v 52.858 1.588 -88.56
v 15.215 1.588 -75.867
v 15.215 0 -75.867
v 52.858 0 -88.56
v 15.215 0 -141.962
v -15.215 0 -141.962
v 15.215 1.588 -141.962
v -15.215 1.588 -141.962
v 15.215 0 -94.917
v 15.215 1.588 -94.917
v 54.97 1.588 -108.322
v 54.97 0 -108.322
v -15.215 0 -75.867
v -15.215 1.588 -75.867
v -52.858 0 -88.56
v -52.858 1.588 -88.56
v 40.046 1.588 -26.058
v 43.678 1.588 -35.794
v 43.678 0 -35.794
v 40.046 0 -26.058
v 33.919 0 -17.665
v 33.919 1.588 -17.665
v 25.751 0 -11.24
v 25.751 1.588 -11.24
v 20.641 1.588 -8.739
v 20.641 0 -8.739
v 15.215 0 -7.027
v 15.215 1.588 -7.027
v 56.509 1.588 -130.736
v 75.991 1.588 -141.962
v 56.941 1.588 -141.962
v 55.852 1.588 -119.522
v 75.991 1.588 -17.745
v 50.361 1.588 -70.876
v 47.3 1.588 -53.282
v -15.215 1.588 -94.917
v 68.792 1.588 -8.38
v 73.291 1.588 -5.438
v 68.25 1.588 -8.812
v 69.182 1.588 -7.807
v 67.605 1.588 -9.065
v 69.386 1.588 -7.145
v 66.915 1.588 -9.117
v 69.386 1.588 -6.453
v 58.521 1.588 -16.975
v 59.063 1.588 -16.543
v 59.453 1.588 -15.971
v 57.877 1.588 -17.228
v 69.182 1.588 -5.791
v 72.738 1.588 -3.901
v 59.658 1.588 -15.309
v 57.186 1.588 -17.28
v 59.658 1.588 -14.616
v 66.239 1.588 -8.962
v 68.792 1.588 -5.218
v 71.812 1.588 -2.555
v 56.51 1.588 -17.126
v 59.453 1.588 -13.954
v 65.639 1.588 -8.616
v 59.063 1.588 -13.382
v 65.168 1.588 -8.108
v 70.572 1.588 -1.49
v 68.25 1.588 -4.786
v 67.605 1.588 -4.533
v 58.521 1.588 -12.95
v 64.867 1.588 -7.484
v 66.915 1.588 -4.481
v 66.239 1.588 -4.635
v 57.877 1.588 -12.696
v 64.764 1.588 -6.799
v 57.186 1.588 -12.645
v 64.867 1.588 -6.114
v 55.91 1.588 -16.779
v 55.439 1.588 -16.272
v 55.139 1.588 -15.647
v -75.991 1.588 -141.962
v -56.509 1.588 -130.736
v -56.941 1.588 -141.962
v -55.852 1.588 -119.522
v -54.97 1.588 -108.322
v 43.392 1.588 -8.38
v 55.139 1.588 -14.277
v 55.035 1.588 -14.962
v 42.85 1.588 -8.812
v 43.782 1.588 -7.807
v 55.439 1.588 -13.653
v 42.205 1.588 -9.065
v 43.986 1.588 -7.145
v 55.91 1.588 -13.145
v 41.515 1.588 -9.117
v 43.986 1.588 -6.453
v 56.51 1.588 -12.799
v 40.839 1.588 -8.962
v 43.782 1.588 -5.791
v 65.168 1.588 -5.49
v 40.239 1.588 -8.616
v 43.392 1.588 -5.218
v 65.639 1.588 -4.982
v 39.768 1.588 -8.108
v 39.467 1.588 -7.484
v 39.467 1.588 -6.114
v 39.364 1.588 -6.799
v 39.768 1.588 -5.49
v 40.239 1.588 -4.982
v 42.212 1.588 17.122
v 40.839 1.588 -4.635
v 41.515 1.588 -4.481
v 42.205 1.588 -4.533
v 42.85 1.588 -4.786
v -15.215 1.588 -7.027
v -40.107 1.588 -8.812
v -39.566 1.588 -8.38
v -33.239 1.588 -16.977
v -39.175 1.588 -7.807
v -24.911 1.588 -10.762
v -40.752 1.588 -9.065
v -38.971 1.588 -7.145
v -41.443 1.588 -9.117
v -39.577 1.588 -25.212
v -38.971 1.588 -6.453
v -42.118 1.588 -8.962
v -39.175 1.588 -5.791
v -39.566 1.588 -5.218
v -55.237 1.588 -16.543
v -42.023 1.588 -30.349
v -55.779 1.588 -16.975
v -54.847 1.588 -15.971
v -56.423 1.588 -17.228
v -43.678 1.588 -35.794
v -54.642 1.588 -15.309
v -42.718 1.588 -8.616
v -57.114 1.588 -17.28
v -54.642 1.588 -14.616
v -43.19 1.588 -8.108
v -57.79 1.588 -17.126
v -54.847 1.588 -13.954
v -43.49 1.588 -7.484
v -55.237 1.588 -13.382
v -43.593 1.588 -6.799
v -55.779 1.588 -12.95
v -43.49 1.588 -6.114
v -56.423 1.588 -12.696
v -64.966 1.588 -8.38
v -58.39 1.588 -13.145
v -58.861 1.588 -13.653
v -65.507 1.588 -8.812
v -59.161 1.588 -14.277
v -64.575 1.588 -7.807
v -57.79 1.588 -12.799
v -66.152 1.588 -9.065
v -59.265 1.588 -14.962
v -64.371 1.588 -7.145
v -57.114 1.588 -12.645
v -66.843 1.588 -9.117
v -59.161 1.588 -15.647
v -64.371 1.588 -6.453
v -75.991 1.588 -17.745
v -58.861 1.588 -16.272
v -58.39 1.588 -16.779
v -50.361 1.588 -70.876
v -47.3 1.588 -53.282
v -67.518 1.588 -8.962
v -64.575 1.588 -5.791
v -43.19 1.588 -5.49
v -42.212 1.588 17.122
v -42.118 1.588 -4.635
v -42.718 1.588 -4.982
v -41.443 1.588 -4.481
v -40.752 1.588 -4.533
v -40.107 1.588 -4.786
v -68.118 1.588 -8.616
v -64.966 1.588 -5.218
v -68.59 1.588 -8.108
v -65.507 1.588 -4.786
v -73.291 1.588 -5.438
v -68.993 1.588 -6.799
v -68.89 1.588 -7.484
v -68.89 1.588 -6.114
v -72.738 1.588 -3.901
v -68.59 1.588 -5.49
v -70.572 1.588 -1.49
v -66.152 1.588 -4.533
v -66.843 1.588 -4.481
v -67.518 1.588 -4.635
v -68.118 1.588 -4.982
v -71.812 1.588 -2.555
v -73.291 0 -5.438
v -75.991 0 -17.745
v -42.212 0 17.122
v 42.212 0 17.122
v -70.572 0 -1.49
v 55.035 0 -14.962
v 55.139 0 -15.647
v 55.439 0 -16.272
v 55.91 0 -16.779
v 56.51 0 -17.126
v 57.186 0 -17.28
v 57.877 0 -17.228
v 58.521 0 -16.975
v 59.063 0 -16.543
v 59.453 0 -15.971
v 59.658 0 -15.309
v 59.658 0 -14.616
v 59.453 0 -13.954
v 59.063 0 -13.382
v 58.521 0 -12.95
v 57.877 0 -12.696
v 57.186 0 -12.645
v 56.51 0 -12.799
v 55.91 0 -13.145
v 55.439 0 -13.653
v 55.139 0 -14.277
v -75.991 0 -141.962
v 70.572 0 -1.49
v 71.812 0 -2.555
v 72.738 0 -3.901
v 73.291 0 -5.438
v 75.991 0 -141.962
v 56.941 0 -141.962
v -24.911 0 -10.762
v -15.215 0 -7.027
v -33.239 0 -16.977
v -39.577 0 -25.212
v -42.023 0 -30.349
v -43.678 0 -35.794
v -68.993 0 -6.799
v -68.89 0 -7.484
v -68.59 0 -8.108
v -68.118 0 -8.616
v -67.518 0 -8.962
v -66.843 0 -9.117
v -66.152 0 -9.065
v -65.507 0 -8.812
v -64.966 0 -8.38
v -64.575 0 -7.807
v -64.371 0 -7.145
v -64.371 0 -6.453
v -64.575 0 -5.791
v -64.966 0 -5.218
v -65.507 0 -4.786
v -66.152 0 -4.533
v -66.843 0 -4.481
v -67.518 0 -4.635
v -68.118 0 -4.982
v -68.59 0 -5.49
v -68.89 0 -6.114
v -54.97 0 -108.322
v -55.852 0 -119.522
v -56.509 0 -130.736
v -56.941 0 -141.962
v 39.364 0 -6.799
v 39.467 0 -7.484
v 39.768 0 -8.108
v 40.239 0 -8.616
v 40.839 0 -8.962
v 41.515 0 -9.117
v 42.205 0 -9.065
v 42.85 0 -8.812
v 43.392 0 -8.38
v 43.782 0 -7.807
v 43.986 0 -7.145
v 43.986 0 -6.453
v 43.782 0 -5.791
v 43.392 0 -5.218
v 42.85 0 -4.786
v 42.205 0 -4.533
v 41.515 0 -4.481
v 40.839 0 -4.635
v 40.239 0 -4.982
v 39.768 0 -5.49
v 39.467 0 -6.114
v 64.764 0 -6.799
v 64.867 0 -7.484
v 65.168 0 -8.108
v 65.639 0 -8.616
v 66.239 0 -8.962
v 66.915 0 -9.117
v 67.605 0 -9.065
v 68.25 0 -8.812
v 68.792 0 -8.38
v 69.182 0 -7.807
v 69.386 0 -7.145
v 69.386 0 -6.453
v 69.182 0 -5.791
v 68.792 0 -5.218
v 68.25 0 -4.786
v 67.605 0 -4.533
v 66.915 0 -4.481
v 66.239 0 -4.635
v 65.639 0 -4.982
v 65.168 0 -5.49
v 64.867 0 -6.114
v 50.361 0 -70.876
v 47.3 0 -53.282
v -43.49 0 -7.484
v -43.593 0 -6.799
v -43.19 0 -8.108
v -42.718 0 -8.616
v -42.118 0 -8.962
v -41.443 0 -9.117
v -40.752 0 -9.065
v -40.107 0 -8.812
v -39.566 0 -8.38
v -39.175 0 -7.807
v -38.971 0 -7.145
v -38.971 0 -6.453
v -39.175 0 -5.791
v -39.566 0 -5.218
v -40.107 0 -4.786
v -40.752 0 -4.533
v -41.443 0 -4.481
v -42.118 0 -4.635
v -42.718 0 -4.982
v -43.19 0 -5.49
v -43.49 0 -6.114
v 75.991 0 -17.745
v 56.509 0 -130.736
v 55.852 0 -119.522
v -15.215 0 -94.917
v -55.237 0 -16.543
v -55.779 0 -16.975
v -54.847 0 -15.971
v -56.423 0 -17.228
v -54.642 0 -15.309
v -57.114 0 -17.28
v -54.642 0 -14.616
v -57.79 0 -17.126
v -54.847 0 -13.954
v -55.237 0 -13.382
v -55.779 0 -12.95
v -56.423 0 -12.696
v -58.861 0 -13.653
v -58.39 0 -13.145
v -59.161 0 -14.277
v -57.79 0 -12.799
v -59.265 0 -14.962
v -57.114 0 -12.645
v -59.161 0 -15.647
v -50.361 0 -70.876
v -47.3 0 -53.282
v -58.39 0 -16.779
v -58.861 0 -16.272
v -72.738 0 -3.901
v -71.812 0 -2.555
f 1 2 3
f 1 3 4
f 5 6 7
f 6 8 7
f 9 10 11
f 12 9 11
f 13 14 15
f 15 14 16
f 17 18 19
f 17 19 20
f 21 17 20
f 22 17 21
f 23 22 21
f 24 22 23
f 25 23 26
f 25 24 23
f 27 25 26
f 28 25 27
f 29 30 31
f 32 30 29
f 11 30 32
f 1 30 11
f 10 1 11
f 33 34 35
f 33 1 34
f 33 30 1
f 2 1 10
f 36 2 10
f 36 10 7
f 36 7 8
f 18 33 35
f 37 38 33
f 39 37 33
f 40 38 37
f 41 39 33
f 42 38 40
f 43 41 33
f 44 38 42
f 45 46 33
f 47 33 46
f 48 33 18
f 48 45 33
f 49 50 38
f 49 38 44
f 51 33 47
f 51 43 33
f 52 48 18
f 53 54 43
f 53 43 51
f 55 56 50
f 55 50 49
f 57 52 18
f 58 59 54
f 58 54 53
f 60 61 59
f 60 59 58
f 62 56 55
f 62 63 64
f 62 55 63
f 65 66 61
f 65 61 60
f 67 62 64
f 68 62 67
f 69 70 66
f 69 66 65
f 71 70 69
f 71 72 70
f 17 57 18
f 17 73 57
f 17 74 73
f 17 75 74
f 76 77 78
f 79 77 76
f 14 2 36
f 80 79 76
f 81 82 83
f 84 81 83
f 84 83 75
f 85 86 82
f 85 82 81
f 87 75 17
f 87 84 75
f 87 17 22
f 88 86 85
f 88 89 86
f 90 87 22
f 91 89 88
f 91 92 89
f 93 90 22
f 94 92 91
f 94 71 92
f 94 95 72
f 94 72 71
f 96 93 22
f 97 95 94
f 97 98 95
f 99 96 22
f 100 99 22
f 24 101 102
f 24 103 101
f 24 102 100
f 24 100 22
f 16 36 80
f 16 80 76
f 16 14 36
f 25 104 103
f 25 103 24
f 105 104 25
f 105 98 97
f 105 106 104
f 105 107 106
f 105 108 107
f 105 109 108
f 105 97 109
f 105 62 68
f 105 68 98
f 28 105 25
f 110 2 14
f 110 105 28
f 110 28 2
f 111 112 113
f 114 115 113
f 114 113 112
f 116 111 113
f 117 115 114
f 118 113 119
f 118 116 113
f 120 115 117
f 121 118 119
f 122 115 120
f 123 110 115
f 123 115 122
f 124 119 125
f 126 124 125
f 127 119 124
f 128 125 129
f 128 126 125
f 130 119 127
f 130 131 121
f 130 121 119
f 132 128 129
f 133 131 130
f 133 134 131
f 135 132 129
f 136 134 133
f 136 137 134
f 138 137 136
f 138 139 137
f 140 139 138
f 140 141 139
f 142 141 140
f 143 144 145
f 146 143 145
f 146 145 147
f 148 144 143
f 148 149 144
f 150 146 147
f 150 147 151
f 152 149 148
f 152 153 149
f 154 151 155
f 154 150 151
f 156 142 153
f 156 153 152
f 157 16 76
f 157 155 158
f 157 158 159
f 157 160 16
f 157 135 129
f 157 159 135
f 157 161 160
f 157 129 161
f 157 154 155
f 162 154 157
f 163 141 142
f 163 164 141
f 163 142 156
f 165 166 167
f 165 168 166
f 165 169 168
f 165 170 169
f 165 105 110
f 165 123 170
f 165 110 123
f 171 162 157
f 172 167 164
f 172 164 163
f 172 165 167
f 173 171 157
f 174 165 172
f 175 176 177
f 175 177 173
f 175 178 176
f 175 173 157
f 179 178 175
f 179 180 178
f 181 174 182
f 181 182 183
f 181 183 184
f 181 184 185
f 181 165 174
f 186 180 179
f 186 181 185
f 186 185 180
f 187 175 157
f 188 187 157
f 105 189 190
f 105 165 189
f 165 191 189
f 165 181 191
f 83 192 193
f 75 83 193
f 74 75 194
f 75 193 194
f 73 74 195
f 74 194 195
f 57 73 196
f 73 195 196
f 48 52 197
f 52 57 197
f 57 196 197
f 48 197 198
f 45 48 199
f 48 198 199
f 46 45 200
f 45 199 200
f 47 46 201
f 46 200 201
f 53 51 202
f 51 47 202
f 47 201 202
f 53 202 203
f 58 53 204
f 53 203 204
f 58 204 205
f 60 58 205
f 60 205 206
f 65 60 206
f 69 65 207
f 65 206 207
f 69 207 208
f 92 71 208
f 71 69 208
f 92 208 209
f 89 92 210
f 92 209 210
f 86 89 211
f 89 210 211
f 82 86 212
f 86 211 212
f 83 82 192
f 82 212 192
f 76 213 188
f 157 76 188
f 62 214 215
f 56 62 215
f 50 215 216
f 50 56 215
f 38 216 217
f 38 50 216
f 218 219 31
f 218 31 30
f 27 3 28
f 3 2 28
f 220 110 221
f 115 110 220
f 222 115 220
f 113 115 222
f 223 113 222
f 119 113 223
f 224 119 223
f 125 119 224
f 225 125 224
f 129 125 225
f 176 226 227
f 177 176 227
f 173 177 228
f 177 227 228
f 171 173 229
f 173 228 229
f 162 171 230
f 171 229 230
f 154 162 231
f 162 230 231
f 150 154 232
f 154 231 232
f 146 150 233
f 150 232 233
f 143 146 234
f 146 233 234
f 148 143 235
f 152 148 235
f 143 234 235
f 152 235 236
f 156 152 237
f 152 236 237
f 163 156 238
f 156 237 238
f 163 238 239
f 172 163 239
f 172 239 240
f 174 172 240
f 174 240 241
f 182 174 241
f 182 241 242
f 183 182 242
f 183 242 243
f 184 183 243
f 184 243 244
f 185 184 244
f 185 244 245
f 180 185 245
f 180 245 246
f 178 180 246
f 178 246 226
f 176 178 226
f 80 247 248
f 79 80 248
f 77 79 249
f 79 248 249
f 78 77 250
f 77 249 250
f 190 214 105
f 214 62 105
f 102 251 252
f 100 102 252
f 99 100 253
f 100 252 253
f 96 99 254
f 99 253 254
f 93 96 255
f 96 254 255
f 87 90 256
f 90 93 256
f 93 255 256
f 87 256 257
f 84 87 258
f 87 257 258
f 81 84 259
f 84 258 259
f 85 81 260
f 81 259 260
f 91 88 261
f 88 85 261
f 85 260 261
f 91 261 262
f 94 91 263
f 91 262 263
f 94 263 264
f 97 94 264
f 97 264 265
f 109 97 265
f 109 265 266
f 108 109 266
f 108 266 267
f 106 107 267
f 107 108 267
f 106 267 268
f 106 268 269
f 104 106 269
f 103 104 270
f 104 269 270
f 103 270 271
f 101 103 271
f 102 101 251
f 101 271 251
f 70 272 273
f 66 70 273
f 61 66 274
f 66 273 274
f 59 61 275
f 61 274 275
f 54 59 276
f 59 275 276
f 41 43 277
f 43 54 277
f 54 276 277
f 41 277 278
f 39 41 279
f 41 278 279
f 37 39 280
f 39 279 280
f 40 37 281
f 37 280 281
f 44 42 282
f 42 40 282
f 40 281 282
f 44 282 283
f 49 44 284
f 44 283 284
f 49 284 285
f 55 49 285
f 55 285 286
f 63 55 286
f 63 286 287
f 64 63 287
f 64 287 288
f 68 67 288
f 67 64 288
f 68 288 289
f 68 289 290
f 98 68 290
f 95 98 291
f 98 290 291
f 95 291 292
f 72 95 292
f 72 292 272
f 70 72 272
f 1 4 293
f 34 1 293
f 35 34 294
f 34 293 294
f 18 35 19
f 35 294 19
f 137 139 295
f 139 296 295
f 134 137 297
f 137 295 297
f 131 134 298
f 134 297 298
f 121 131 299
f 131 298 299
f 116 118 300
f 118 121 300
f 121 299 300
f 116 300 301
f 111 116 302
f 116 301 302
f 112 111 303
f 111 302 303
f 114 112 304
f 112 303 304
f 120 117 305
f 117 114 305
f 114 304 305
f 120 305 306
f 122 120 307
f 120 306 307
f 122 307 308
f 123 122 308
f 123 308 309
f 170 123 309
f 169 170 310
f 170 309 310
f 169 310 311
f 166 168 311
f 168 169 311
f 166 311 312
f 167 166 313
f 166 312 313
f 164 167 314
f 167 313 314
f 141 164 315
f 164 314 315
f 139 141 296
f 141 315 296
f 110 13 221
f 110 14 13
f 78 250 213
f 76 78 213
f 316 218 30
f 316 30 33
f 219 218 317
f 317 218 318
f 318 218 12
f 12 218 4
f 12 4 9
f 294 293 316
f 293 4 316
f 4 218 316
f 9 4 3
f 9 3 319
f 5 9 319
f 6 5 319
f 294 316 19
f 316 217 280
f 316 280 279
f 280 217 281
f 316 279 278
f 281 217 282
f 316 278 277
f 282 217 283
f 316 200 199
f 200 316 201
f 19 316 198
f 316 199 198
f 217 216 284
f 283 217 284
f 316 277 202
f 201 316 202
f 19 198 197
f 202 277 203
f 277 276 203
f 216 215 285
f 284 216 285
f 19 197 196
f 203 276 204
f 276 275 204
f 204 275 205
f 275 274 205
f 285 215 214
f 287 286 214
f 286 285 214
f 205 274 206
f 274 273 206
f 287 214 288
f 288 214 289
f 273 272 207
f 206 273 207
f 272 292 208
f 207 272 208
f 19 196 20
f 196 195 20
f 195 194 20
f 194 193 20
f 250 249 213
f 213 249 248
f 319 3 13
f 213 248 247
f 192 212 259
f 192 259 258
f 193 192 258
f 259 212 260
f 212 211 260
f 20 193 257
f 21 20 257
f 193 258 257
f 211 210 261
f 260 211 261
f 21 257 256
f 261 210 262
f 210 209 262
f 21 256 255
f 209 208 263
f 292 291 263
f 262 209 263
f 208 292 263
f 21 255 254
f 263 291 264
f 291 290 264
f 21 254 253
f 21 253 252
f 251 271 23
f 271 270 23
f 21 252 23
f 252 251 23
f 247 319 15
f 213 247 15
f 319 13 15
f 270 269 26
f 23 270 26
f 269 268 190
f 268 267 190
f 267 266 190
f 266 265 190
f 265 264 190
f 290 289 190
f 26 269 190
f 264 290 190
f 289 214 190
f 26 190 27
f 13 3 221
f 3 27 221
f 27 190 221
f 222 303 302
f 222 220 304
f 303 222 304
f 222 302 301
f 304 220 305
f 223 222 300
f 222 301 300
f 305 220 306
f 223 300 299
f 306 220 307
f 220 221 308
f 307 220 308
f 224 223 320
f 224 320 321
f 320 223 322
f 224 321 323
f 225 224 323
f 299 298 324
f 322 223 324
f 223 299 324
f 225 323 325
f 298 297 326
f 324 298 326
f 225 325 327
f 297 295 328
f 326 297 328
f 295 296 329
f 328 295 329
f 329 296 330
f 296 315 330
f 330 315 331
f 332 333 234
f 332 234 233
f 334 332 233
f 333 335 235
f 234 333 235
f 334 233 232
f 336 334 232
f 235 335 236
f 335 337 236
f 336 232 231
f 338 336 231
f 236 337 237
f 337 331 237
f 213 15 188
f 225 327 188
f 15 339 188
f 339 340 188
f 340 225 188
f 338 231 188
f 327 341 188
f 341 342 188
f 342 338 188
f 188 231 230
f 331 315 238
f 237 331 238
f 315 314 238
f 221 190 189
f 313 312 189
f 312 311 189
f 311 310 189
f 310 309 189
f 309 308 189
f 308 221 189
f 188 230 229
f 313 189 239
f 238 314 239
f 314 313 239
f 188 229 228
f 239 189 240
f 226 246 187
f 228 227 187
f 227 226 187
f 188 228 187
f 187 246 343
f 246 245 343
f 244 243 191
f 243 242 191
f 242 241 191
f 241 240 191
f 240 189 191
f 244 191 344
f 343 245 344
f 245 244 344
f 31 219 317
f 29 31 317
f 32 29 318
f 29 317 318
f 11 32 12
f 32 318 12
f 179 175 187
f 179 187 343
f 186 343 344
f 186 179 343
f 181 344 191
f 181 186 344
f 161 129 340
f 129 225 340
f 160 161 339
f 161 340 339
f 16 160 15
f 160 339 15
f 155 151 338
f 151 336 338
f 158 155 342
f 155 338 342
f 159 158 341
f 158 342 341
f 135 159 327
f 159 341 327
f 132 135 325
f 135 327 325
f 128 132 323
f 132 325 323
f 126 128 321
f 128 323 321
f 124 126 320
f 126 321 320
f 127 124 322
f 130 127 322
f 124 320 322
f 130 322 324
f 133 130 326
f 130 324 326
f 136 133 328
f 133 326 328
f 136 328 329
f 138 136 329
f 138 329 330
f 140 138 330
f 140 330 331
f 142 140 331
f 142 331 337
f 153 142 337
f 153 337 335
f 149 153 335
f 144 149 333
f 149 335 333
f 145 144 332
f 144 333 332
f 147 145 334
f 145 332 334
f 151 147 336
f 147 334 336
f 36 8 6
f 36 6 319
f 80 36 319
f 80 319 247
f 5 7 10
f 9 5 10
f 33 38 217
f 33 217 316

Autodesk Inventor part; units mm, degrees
ref_plane "YZ Plane" through (0, 0, 0) normal (1, 0, 0) x (0, 1, 0)
ref_plane "XZ Plane" through (0, 0, 0) normal (0, 1, 0) x (-1, 0, 0)
ref_plane "XY Plane" through (0, 0, 0) normal (0, 0, 1) x (1, 0, 0)
sketch "Sketch1" plane through (0, 0, 0) normal (0, 1, 0) x (-1, 0, 0)
  circle A0 centre (56.9406, -14.9623) radius 2.3241
  circle A1 centre (66.6693, -6.7989) radius 2.3241
  circle A2 centre (41.2693, -6.7989) radius 2.3241
  circle A3 centre (-41.6882, -6.7989) radius 2.3241
  circle A4 centre (-57.3594, -14.9623) radius 2.3241
  circle A5 centre (-67.0882, -6.7989) radius 2.3241
  arc A6 (-59.7156, -7.3708) -> (-58.0844, -7.6169) centre (-58.6976, -6.1526) ccw
  line L0 (-59.7156, -7.3708) -> (-85.288, 13.999)
  arc A7 (-43.7185, -2.4382) -> (-58.0844, -7.6169) centre (0.2546, -146.9346) ccw
  arc A8 (-43.7185, -2.4382) -> (-37.2086, 0.6056) centre (-51.1134, 21.8615) ccw
  arc A9 (-69.7478, -12.8722) -> (-69.4607, -10.2448) centre (-70.4786, -11.4629) ccw
  line L1 (-99.204, 14.6104) -> (-69.4607, -10.2448)
  arc A10 (-69.7478, -12.8722) -> (-78.2828, -17.6558) centre (-0.2094, -146.9516) ccw
  arc A11 (-16.3345, 6.2393) -> (-15.3068, 3.3313) centre (-15.4655, 4.9108) ccw
  arc A12 (14.8879, 3.3313) -> (-15.3068, 3.3313) centre (-0.2094, -146.9516) ccw
  arc A13 (14.8879, 3.3313) -> (15.9157, 6.2393) centre (15.0466, 4.9108) ccw
  arc A14 (37.2538, 0.5886) -> (43.7637, -2.4551) centre (51.1586, 21.8446) ccw
  arc A15 (58.1296, -7.6339) -> (43.7637, -2.4551) centre (-0.2094, -146.9516) ccw
  line L2 (85.3331, 13.982) -> (59.7607, -7.3877)
  arc A16 (58.1296, -7.6339) -> (59.7607, -7.3877) centre (58.7428, -6.1696) ccw
  line L3 (69.0418, -10.2448) -> (98.7851, 14.6104)
  arc A17 (69.0418, -10.2448) -> (69.3289, -12.8722) centre (70.0598, -11.4629) ccw
  arc A18 (77.8639, -17.6558) -> (69.3289, -12.8722) centre (-0.2094, -146.9516) ccw
  line L4 (66.6693, -6.7989) -> (41.2693, -6.7989)
  line L5 (0, 0) -> (0, 4.0875)
  circle A19 centre (66.6693, -6.7989) radius 3.9782
  circle A20 centre (41.2693, -6.7989) radius 4.9026
  line L6 (66.6693, -2.8207) -> (41.4483, -1.8996)
  circle A21 centre (56.9406, -14.9623) radius 4.1852
  line L7 (69.4813, -9.613) -> (60.0669, -17.7447)
  line L8 (54.6165, -18.4429) -> (39.1949, -11.241)
  line L9 (56.9406, -14.9623) -> (56.9406, -141.9623)
  arc A22 (56.9406, -141.9623) -> (36.3667, -6.7989) centre (-501.2889, -157.7854) ccw
  line L10 (56.9406, -141.9623) -> (75.9906, -141.9623)
  line L11 (75.9906, -141.9623) -> (75.9906, -17.7447)
  line L12 (75.9906, -17.7447) -> (65.708, -12.8722)
  circle A23 centre (-66.6693, -6.7989) radius 3.9782
  circle A24 centre (-41.2693, -6.7989) radius 4.9026
  line L13 (-66.6693, -2.8207) -> (-41.4483, -1.8996)
  circle A25 centre (-56.9406, -14.9623) radius 4.1852
  line L14 (-69.4813, -9.613) -> (-60.0669, -17.7447)
  arc A26 (-36.3667, -6.7989) -> (-56.9406, -141.9623) centre (501.2889, -157.7854) ccw
  line L15 (-56.9406, -141.9623) -> (-75.9906, -141.9623)
  line L16 (-75.9906, -141.9623) -> (-75.9906, -17.7447)
  line L17 (-75.9906, -17.7447) -> (-65.708, -12.8722)
  arc A27 (42.2115, -1.9275) -> (-42.2115, -1.9275) centre (0, -148.5156) ccw
  arc A28 (39.6774, -11.4417) -> (-39.7321, -11.4576) centre (0, -148.5156) ccw
  point P0 (-37.4811, -10.825)
  point P1 (37.4811, -10.825)
  dimension "d0" = 127
  dimension "d1" = 19.05
extrude "Extrusion1" add sketch "Sketch1" along normal blind 1.5875 contours L0 L13 A8 A7 A6 | A6 A7 A8 A24 A26 L15 L16 L17 L14 A23 L13 L0 | A23 L14 | L13 A24 A8 | A27 L6 A20 A22 A28 A26 A24 L13 | A24 A26 | A26 A24 | L6 L2 L4 A15 A14 | A14 A20 L6 | A14 A15 L4 A20 | A20 A22 | L6 A19 L2 | A28 L8 A21 L9 A22 | A22 A20 L8 A28 | L4 A15 A16 L2 A19 L7 A21 L8 A20 | A22 A20 | A19 L4 L2 | A19 L7 | L9 A21 L7 L12 L11 L10 | L4 L2 A16 A15 | A21 | A25 picked at (-63.4219, -7.1214) picked at (63.3048, -7.3068)
fillet "Fillet1" radius 38.1 2 edges at (37.4811, 0.7937, -10.825) (-37.4811, 0.7937, -10.825)
sketch "Sketch2" plane through (0, 1.5875, 0) normal (0, 1, 0) x (1, 0, 0)
  line L0 (0, 0) -> (0, -4.0291)
  arc A0 (-42.2115, 1.9275) -> (42.2115, 1.9275) centre (0, 148.5156) ccw projected
  line L1 (42.2115, 1.9275) -> (66.6693, 2.8207) projected
  arc A1 (66.6693, 2.8207) -> (69.4813, 9.613) centre (66.6693, 6.7989) ccw projected
  line L2 (69.4813, 9.613) -> (65.708, 12.8722) projected
  line L3 (65.708, 12.8722) -> (75.9906, 17.7447) projected
  line L4 (75.9906, 17.7447) -> (75.9906, 141.9623) projected
  line L5 (75.9906, 141.9623) -> (56.9406, 141.9623) projected
  arc A2 (43.6777, 35.794) -> (56.9406, 141.9623) centre (-501.2889, 157.7854) ccw projected
  arc A3 (8.8646, 6.0903) -> (43.6777, 35.794) centre (6.4979, 44.1168) ccw projected
  arc A4 (-8.8646, 6.0903) -> (8.8646, 6.0903) centre (0, 148.5156) ccw projected
  arc A5 (-43.6777, 35.794) -> (-8.8646, 6.0903) centre (-6.4979, 44.1168) ccw projected
  arc A6 (-56.9406, 141.9623) -> (-43.6777, 35.794) centre (501.2889, 157.7854) ccw projected
  line L6 (-56.9406, 141.9623) -> (-75.9906, 141.9623) projected
  line L7 (-75.9906, 141.9623) -> (-75.9906, 17.7447) projected
  line L8 (-75.9906, 17.7447) -> (-65.708, 12.8722) projected
  line L9 (-65.708, 12.8722) -> (-69.4813, 9.613) projected
  arc A7 (-69.4813, 9.613) -> (-66.6693, 2.8207) centre (-66.6693, 6.7989) ccw projected
  line L10 (-66.6693, 2.8207) -> (-42.2115, 1.9275) projected
  arc A8 (-42.2115, 1.9275) -> (42.2115, 1.9275) centre (0, 148.5156) ccw projected
  circle A9 centre (-41.2693, 6.7989) radius 2.3241 projected
  circle A10 centre (-66.6693, 6.7989) radius 2.3241 projected
  circle A11 centre (57.3594, 14.9623) radius 2.3241 projected
  circle A12 centre (67.0882, 6.7989) radius 2.3241 projected
  circle A13 centre (41.6882, 6.7989) radius 2.3241 projected
  circle A14 centre (-56.9406, 14.9623) radius 2.3241 projected
  circle A15 centre (67.0882, 6.7989) radius 6.35
  line L11 (73.2907, 5.4382) -> (75.9906, 17.7447)
  line L12 (42.2115, 1.9275) -> (66.7086, 0.4603)
  circle A16 centre (-67.0882, 6.7989) radius 6.35
  line L13 (-73.2907, 5.4382) -> (-75.9906, 17.7447)
  line L14 (-42.2115, 1.9275) -> (-66.7086, 0.4603)
  point P0 (-42.2115, 1.9275)
  dimension "d5" = 12.7
extrude "Extrusion2" add sketch "Sketch2" against normal blind 1.5875 contours L14 A16 L10 | A16 L8 L9 A7 L10 | L1 A15 L12 | L13 L8 A16 | L1 A1 L2 L3 A15 | L3 L11 A15 picked at (-67.6214, 11.869) picked at (67.6293, 11.8682)
sketch "Sketch3" plane through (0, 1.5875, 0) normal (0, 1, 0) x (1, 0, 0)
  line L0 (75.9906, 17.7447) -> (75.9906, 141.9623) projected
  line L1 (75.9906, 141.9623) -> (56.9406, 141.9623) projected
  arc A0 (43.6777, 35.794) -> (56.9406, 141.9623) centre (-501.2889, 157.7854) ccw projected
  arc A1 (8.8646, 6.0903) -> (43.6777, 35.794) centre (6.4979, 44.1168) ccw projected
  arc A2 (-8.8646, 6.0903) -> (8.8646, 6.0903) centre (0, 148.5156) ccw projected
  arc A3 (-43.6777, 35.794) -> (-8.8646, 6.0903) centre (-6.4979, 44.1168) ccw projected
  arc A4 (-56.9406, 141.9623) -> (-43.6777, 35.794) centre (501.2889, 157.7854) ccw projected
  line L2 (-56.9406, 141.9623) -> (-75.9906, 141.9623) projected
  line L3 (-75.9906, 141.9623) -> (-75.9906, 17.7447) projected
  line L4 (-75.9906, 17.7447) -> (-73.2907, 5.4382) projected
  arc A5 (-73.2907, 5.4382) -> (-66.7086, 0.4603) centre (-67.0882, 6.7989) ccw projected
  line L5 (-66.7086, 0.4603) -> (-42.2115, 1.9275) projected
  arc A6 (-42.2115, 1.9275) -> (42.2115, 1.9275) centre (0, 148.5156) ccw projected
  line L6 (42.2115, 1.9275) -> (66.7086, 0.4603) projected
  arc A7 (66.7086, 0.4603) -> (73.2907, 5.4382) centre (67.0882, 6.7989) ccw projected
  line L7 (73.2907, 5.4382) -> (75.9906, 17.7447) projected
  circle A8 centre (-41.2693, 6.7989) radius 2.3241 projected
  circle A9 centre (-66.6693, 6.7989) radius 2.3241 projected
  circle A10 centre (57.3594, 14.9623) radius 2.3241 projected
  circle A11 centre (67.0882, 6.7989) radius 2.3241 projected
  circle A12 centre (41.6882, 6.7989) radius 2.3241 projected
  circle A13 centre (-56.9406, 14.9623) radius 2.3241 projected
  line L8 (-75.9906, 141.9623) -> (-75.9906, 17.7447) projected
  line L9 (75.9906, 17.7447) -> (-75.9906, 17.7447)
  line L10 (-75.9906, 17.7447) -> (0, 17.7447)
  line L11 (0, 17.7447) -> (0, 5.8147)
  arc A14 (-8.8646, 6.0903) -> (8.8646, 6.0903) centre (0, 148.5156) ccw projected
  line L12 (8.8646, 141.9623) -> (-8.8646, 141.9623)
  line L13 (8.8646, 141.9623) -> (15.2146, 141.9623)
  line L14 (-8.8646, 141.9623) -> (-15.2146, 141.9623)
  line L15 (-15.2146, 141.9623) -> (-15.2146, 7.0273)
  line L16 (15.2146, 141.9623) -> (15.2146, 7.0273)
  point P0 (0, 0)
  dimension "d8" = 6.35
  dimension "d9" = 6.35
extrude "Extrusion3" add sketch "Sketch3" against normal blind 1.5875 contours A1 A2 L11 L9 L16 | L9 L15 L14 L12 L13 L16 | L11 A2 A3 L15 L9
sketch "Sketch4" plane through (0, 1.5875, 0) normal (0, 1, 0) x (1, 0, 0)
  line L0 (75.9906, 17.7447) -> (75.9906, 141.9623) projected
  line L1 (75.9906, 141.9623) -> (56.9406, 141.9623) projected
  arc A0 (43.6777, 35.794) -> (56.9406, 141.9623) centre (-501.2889, 157.7854) ccw projected
  arc A1 (15.2146, 7.0273) -> (43.6777, 35.794) centre (6.4979, 44.1168) ccw projected
  line L2 (15.2146, 7.0273) -> (15.2146, 141.9623) projected
  line L3 (15.2146, 141.9623) -> (-15.2146, 141.9623) projected
  line L4 (-15.2146, 141.9623) -> (-15.2146, 7.0273) projected
  arc A2 (-43.6777, 35.794) -> (-15.2146, 7.0273) centre (-6.4979, 44.1168) ccw projected
  arc A3 (-56.9406, 141.9623) -> (-43.6777, 35.794) centre (501.2889, 157.7854) ccw projected
  line L5 (-56.9406, 141.9623) -> (-75.9906, 141.9623) projected
  line L6 (-75.9906, 141.9623) -> (-75.9906, 17.7447) projected
  line L7 (-75.9906, 17.7447) -> (-73.2907, 5.4382) projected
  arc A4 (-73.2907, 5.4382) -> (-66.7086, 0.4603) centre (-67.0882, 6.7989) ccw projected
  line L8 (-66.7086, 0.4603) -> (-42.2115, 1.9275) projected
  arc A5 (-42.2115, 1.9275) -> (42.2115, 1.9275) centre (0, 148.5156) ccw projected
  line L9 (42.2115, 1.9275) -> (66.7086, 0.4603) projected
  arc A6 (66.7086, 0.4603) -> (73.2907, 5.4382) centre (67.0882, 6.7989) ccw projected
  line L10 (73.2907, 5.4382) -> (75.9906, 17.7447) projected
  circle A7 centre (-41.2693, 6.7989) radius 2.3241 projected
  circle A8 centre (-66.6693, 6.7989) radius 2.3241 projected
  circle A9 centre (57.3594, 14.9623) radius 2.3241 projected
  circle A10 centre (67.0882, 6.7989) radius 2.3241 projected
  circle A11 centre (41.6882, 6.7989) radius 2.3241 projected
  circle A12 centre (-56.9406, 14.9623) radius 2.3241 projected
  line L11 (-15.2146, 44.1168) -> (15.2146, 44.1168)
  line L12 (15.2146, 44.1168) -> (15.2146, 75.8668)
  line L13 (15.2146, 75.8668) -> (52.8576, 88.5598)
  arc A13 (43.6777, 35.794) -> (56.9406, 141.9623) centre (-501.2889, 157.7854) ccw projected
  line L14 (15.2146, 75.8668) -> (15.2146, 94.9168)
  line L15 (15.2146, 141.9623) -> (15.2146, 7.0273) projected
  line L16 (15.2146, 94.9168) -> (54.9699, 108.3221)
  line L17 (0, 44.1168) -> (0, 50.0619)
  line L18 (-15.2146, 75.8668) -> (-52.8576, 88.5598)
  line L19 (-15.2146, 94.9168) -> (-54.9699, 108.3221)
  point P0 (0, 0)
  dimension "d12" = 31.75
  dimension "d13" = 19.05
extrude "Extrusion4" add sketch "Sketch4" against normal blind 1.5875 contours A0 L13 L2 L16 | L4 L18 A3 L19
sketch "Sketch5" plane through (0, 1.5875, 0) normal (0, 1, 0) x (1, 0, 0)
  arc A0 (43.6777, 35.794) -> (52.8576, 88.5598) centre (-501.2889, 157.7854) ccw projected
  arc A1 (15.2146, 7.0273) -> (43.6777, 35.794) centre (6.4979, 44.1168) ccw projected
  line L0 (15.2146, 7.0273) -> (15.2146, 75.8668) projected
  line L1 (15.2146, 75.8668) -> (52.8576, 88.5598) projected
  line L2 (54.9699, 108.3221) -> (15.2146, 94.9168) projected
  line L3 (15.2146, 94.9168) -> (15.2146, 141.9623) projected
  line L4 (15.2146, 141.9623) -> (-15.2146, 141.9623) projected
  line L5 (-15.2146, 141.9623) -> (-15.2146, 94.9168) projected
  line L6 (-15.2146, 94.9168) -> (-54.9699, 108.3221) projected
  arc A2 (-56.9406, 141.9623) -> (-54.9699, 108.3221) centre (501.2889, 157.7854) ccw projected
  line L7 (-56.9406, 141.9623) -> (-75.9906, 141.9623) projected
  line L8 (-75.9906, 141.9623) -> (-75.9906, 17.7447) projected
  line L9 (-75.9906, 17.7447) -> (-73.2907, 5.4382) projected
  arc A3 (-73.2907, 5.4382) -> (-66.7086, 0.4603) centre (-67.0882, 6.7989) ccw projected
  line L10 (-66.7086, 0.4603) -> (-42.2115, 1.9275) projected
  arc A4 (-42.2115, 1.9275) -> (42.2115, 1.9275) centre (0, 148.5156) ccw projected
  line L11 (42.2115, 1.9275) -> (66.7086, 0.4603) projected
  arc A5 (66.7086, 0.4603) -> (73.2907, 5.4382) centre (67.0882, 6.7989) ccw projected
  line L12 (73.2907, 5.4382) -> (75.9906, 17.7447) projected
  line L13 (75.9906, 17.7447) -> (75.9906, 141.9623) projected
  line L14 (75.9906, 141.9623) -> (56.9406, 141.9623) projected
  arc A6 (54.9699, 108.3221) -> (56.9406, 141.9623) centre (-501.2889, 157.7854) ccw projected
  line L15 (-52.8576, 88.5598) -> (-15.2146, 75.8668) projected
  line L16 (-15.2146, 75.8668) -> (-15.2146, 7.0273) projected
  arc A7 (-43.6777, 35.794) -> (-15.2146, 7.0273) centre (-6.4979, 44.1168) ccw projected
  arc A8 (-52.8576, 88.5598) -> (-43.6777, 35.794) centre (501.2889, 157.7854) ccw projected
  circle A9 centre (-41.2693, 6.7989) radius 2.3241 projected
  circle A10 centre (-66.6693, 6.7989) radius 2.3241 projected
  circle A11 centre (57.3594, 14.9623) radius 2.3241 projected
  circle A12 centre (67.0882, 6.7989) radius 2.3241 projected
  circle A13 centre (41.6882, 6.7989) radius 2.3241 projected
  circle A14 centre (-56.9406, 14.9623) radius 2.3241 projected
  line L17 (-42.2115, 1.9275) -> (-42.2115, -17.1225)
  line L18 (-70.5723, 1.4901) -> (-42.2115, -17.1225)
  line L19 (0, 0) -> (0, -4.0291)
  arc A15 (-73.2907, 5.4382) -> (-66.7086, 0.4603) centre (-67.0882, 6.7989) ccw projected
  line L20 (42.2115, 1.9275) -> (42.2115, -17.1225)
  line L21 (70.5723, 1.4901) -> (42.2115, -17.1225)
  line L22 (-42.2115, -17.1225) -> (42.2115, -17.1225)
  dimension "d16" = 19.05
extrude "Extrusion5" add sketch "Sketch5" against normal blind 1.5875 contours L21 L20 L11 A5 | L22 L17 A4 L20 | L18 A3 L10 L17
properties part number "ABS Intake Hood"
